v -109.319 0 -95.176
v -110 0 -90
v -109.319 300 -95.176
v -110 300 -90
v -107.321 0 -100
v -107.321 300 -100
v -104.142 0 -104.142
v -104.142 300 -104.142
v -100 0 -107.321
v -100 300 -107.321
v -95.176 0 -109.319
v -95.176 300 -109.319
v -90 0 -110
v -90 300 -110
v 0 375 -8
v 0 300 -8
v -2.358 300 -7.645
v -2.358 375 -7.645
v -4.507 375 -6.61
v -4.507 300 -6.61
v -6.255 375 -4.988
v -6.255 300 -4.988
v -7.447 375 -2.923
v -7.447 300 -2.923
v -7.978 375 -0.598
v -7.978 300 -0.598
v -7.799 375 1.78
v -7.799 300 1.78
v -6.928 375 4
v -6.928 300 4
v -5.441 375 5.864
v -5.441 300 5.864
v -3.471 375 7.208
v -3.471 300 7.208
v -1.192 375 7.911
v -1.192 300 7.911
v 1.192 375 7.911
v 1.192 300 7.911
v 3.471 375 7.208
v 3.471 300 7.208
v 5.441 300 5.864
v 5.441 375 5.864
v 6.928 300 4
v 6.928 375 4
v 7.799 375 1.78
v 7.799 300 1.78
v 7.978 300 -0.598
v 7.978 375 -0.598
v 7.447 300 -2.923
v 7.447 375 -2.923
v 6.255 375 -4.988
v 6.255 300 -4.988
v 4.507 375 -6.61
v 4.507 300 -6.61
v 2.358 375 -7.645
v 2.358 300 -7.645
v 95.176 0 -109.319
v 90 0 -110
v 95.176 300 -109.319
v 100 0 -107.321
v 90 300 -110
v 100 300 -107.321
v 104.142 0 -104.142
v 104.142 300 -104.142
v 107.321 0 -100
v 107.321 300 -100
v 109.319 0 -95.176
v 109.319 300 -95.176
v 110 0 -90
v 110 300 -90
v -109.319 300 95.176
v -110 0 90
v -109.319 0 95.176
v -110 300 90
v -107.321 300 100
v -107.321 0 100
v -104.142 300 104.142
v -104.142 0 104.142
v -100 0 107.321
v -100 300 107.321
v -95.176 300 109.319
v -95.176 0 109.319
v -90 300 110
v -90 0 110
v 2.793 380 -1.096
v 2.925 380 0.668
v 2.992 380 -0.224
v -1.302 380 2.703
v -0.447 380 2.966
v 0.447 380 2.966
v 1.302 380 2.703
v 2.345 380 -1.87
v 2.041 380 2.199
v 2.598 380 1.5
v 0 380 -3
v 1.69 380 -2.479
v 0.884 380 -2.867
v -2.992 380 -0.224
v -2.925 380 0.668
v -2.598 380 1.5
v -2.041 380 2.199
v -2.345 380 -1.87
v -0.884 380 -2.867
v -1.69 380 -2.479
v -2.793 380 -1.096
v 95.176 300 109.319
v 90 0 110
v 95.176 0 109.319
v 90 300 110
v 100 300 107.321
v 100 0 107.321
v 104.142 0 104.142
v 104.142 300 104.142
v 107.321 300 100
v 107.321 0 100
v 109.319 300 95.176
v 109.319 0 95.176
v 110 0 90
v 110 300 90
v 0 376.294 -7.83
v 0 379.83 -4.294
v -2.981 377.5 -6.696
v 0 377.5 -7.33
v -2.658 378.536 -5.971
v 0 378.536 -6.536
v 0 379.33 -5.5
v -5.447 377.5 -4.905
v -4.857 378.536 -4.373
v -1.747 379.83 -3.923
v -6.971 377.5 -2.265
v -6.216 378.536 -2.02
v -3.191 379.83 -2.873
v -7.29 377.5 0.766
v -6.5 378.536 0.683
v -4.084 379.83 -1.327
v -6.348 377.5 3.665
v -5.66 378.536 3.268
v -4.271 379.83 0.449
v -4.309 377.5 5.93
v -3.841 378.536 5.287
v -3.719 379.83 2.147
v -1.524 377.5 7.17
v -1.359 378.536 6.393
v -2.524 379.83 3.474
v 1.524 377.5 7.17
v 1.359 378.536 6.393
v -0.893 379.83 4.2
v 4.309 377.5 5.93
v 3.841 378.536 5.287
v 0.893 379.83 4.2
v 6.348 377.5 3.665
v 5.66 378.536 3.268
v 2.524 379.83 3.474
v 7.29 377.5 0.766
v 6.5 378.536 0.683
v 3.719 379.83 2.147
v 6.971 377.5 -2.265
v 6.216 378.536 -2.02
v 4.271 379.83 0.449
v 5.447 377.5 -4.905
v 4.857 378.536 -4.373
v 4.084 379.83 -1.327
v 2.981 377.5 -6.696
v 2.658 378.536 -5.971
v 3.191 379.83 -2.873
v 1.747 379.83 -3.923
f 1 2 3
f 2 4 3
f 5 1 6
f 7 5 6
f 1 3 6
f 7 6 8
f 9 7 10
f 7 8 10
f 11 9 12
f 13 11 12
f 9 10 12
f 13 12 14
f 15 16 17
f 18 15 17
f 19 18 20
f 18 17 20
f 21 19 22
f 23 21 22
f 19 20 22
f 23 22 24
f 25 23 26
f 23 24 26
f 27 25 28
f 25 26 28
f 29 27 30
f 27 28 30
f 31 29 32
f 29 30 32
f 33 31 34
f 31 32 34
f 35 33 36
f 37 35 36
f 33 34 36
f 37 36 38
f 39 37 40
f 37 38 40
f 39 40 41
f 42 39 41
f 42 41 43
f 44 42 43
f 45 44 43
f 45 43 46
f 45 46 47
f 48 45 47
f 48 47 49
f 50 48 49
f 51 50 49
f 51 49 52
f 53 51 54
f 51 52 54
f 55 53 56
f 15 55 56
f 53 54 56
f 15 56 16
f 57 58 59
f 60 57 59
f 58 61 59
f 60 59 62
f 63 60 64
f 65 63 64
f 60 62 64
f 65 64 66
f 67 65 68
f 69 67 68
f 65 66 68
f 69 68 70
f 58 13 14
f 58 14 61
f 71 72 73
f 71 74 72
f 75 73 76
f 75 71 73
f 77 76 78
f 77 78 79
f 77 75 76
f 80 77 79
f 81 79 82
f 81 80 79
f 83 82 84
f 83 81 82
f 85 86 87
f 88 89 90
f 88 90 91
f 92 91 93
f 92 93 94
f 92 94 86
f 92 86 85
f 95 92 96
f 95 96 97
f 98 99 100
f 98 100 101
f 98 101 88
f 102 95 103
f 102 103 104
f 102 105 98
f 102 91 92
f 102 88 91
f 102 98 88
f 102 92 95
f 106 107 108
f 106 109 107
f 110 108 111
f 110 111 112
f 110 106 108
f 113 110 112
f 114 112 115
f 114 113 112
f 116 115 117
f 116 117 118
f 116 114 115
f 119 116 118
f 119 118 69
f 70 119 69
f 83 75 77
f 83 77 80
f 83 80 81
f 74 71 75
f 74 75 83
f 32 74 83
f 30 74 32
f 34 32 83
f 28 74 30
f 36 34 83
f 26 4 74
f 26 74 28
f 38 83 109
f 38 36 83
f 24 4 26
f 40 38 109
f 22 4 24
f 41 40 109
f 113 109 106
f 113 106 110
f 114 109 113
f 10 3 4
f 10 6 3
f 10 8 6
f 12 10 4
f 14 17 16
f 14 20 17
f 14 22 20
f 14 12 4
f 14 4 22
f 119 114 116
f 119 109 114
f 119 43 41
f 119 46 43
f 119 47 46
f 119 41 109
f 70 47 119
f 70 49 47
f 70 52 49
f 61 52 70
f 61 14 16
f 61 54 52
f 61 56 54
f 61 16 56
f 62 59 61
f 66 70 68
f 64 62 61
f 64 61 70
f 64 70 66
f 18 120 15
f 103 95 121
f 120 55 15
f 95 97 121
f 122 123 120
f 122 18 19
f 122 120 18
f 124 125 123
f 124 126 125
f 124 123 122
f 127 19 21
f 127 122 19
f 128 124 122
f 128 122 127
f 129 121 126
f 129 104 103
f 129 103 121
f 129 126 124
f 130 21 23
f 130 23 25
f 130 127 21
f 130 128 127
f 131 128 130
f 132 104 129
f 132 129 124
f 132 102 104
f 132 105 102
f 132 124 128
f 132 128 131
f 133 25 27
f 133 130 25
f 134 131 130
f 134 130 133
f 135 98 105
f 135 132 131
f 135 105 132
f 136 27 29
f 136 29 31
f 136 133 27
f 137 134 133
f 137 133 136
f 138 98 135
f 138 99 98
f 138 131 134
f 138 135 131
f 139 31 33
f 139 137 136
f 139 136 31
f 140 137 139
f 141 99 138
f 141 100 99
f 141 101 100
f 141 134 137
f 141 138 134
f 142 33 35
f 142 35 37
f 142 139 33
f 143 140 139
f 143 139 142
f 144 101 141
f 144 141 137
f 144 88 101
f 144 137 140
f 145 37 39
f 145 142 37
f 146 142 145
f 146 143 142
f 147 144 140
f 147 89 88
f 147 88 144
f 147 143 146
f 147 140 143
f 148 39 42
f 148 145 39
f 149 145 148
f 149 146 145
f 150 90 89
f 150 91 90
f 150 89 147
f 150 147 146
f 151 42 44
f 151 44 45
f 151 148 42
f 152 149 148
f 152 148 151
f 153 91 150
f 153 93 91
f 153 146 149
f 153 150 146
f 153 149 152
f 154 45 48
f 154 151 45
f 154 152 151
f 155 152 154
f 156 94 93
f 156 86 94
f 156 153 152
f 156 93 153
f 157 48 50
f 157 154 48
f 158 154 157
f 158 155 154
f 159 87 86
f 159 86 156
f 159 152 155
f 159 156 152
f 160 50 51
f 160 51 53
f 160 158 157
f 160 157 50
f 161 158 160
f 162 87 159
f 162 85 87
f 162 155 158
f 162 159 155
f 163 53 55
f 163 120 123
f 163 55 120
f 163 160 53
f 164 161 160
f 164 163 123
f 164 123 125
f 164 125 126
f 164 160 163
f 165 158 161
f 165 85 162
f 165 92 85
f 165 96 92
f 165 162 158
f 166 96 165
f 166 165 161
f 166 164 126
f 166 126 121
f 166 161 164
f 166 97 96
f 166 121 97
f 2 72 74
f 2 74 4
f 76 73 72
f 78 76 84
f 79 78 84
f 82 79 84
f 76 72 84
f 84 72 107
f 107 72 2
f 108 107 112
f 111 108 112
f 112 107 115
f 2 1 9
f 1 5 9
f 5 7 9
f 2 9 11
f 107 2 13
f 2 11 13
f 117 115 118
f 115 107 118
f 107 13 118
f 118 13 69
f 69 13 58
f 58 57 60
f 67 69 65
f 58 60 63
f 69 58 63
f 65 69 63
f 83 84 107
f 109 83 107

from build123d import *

# Parameters (mm, degrees)
SKETCH1_W           = 220
SKETCH1_H           = 220
BOSS_EXTRUDE1_DEPTH = 300
SKETCH2_R           = 8
BOSS_EXTRUDE2_DEPTH = 80
FILLET1_R           = 20
FILLET2_R           = 5


with BuildPart() as part:
    # Sketch1 → Boss-Extrude1 (new body)
    with BuildSketch(Plane(origin=(0, 0, 0), x_dir=(1, 0, 0), z_dir=(0, 1, 0))):
        Rectangle(SKETCH1_W, SKETCH1_H)
    extrude(amount=BOSS_EXTRUDE1_DEPTH)

    # Sketch2 → Boss-Extrude2 (add)
    with BuildSketch(Plane(origin=(0, 300, 0), x_dir=(1, 0, 0), z_dir=(0, 1, 0))):
        with Locations(Location((0, 0, 0), (0, 0, 90))):
            Circle(SKETCH2_R)
    extrude(amount=BOSS_EXTRUDE2_DEPTH)

    # Fillet1
    fillet1_edges = [part.edges().sort_by_distance(p)[0] for p in [
        (-110, 150, -110),
        (110, 150, -110),
        (110, 150, 110),
        (-110, 150, 110),
    ]]
    fillet(fillet1_edges, radius=FILLET1_R)

    # Fillet2
    fillet2_edges = [part.edges().sort_by_distance(p)[0] for p in [
        (0, 380, 8),
    ]]
    fillet(fillet2_edges, radius=FILLET2_R)


solid = part.part
